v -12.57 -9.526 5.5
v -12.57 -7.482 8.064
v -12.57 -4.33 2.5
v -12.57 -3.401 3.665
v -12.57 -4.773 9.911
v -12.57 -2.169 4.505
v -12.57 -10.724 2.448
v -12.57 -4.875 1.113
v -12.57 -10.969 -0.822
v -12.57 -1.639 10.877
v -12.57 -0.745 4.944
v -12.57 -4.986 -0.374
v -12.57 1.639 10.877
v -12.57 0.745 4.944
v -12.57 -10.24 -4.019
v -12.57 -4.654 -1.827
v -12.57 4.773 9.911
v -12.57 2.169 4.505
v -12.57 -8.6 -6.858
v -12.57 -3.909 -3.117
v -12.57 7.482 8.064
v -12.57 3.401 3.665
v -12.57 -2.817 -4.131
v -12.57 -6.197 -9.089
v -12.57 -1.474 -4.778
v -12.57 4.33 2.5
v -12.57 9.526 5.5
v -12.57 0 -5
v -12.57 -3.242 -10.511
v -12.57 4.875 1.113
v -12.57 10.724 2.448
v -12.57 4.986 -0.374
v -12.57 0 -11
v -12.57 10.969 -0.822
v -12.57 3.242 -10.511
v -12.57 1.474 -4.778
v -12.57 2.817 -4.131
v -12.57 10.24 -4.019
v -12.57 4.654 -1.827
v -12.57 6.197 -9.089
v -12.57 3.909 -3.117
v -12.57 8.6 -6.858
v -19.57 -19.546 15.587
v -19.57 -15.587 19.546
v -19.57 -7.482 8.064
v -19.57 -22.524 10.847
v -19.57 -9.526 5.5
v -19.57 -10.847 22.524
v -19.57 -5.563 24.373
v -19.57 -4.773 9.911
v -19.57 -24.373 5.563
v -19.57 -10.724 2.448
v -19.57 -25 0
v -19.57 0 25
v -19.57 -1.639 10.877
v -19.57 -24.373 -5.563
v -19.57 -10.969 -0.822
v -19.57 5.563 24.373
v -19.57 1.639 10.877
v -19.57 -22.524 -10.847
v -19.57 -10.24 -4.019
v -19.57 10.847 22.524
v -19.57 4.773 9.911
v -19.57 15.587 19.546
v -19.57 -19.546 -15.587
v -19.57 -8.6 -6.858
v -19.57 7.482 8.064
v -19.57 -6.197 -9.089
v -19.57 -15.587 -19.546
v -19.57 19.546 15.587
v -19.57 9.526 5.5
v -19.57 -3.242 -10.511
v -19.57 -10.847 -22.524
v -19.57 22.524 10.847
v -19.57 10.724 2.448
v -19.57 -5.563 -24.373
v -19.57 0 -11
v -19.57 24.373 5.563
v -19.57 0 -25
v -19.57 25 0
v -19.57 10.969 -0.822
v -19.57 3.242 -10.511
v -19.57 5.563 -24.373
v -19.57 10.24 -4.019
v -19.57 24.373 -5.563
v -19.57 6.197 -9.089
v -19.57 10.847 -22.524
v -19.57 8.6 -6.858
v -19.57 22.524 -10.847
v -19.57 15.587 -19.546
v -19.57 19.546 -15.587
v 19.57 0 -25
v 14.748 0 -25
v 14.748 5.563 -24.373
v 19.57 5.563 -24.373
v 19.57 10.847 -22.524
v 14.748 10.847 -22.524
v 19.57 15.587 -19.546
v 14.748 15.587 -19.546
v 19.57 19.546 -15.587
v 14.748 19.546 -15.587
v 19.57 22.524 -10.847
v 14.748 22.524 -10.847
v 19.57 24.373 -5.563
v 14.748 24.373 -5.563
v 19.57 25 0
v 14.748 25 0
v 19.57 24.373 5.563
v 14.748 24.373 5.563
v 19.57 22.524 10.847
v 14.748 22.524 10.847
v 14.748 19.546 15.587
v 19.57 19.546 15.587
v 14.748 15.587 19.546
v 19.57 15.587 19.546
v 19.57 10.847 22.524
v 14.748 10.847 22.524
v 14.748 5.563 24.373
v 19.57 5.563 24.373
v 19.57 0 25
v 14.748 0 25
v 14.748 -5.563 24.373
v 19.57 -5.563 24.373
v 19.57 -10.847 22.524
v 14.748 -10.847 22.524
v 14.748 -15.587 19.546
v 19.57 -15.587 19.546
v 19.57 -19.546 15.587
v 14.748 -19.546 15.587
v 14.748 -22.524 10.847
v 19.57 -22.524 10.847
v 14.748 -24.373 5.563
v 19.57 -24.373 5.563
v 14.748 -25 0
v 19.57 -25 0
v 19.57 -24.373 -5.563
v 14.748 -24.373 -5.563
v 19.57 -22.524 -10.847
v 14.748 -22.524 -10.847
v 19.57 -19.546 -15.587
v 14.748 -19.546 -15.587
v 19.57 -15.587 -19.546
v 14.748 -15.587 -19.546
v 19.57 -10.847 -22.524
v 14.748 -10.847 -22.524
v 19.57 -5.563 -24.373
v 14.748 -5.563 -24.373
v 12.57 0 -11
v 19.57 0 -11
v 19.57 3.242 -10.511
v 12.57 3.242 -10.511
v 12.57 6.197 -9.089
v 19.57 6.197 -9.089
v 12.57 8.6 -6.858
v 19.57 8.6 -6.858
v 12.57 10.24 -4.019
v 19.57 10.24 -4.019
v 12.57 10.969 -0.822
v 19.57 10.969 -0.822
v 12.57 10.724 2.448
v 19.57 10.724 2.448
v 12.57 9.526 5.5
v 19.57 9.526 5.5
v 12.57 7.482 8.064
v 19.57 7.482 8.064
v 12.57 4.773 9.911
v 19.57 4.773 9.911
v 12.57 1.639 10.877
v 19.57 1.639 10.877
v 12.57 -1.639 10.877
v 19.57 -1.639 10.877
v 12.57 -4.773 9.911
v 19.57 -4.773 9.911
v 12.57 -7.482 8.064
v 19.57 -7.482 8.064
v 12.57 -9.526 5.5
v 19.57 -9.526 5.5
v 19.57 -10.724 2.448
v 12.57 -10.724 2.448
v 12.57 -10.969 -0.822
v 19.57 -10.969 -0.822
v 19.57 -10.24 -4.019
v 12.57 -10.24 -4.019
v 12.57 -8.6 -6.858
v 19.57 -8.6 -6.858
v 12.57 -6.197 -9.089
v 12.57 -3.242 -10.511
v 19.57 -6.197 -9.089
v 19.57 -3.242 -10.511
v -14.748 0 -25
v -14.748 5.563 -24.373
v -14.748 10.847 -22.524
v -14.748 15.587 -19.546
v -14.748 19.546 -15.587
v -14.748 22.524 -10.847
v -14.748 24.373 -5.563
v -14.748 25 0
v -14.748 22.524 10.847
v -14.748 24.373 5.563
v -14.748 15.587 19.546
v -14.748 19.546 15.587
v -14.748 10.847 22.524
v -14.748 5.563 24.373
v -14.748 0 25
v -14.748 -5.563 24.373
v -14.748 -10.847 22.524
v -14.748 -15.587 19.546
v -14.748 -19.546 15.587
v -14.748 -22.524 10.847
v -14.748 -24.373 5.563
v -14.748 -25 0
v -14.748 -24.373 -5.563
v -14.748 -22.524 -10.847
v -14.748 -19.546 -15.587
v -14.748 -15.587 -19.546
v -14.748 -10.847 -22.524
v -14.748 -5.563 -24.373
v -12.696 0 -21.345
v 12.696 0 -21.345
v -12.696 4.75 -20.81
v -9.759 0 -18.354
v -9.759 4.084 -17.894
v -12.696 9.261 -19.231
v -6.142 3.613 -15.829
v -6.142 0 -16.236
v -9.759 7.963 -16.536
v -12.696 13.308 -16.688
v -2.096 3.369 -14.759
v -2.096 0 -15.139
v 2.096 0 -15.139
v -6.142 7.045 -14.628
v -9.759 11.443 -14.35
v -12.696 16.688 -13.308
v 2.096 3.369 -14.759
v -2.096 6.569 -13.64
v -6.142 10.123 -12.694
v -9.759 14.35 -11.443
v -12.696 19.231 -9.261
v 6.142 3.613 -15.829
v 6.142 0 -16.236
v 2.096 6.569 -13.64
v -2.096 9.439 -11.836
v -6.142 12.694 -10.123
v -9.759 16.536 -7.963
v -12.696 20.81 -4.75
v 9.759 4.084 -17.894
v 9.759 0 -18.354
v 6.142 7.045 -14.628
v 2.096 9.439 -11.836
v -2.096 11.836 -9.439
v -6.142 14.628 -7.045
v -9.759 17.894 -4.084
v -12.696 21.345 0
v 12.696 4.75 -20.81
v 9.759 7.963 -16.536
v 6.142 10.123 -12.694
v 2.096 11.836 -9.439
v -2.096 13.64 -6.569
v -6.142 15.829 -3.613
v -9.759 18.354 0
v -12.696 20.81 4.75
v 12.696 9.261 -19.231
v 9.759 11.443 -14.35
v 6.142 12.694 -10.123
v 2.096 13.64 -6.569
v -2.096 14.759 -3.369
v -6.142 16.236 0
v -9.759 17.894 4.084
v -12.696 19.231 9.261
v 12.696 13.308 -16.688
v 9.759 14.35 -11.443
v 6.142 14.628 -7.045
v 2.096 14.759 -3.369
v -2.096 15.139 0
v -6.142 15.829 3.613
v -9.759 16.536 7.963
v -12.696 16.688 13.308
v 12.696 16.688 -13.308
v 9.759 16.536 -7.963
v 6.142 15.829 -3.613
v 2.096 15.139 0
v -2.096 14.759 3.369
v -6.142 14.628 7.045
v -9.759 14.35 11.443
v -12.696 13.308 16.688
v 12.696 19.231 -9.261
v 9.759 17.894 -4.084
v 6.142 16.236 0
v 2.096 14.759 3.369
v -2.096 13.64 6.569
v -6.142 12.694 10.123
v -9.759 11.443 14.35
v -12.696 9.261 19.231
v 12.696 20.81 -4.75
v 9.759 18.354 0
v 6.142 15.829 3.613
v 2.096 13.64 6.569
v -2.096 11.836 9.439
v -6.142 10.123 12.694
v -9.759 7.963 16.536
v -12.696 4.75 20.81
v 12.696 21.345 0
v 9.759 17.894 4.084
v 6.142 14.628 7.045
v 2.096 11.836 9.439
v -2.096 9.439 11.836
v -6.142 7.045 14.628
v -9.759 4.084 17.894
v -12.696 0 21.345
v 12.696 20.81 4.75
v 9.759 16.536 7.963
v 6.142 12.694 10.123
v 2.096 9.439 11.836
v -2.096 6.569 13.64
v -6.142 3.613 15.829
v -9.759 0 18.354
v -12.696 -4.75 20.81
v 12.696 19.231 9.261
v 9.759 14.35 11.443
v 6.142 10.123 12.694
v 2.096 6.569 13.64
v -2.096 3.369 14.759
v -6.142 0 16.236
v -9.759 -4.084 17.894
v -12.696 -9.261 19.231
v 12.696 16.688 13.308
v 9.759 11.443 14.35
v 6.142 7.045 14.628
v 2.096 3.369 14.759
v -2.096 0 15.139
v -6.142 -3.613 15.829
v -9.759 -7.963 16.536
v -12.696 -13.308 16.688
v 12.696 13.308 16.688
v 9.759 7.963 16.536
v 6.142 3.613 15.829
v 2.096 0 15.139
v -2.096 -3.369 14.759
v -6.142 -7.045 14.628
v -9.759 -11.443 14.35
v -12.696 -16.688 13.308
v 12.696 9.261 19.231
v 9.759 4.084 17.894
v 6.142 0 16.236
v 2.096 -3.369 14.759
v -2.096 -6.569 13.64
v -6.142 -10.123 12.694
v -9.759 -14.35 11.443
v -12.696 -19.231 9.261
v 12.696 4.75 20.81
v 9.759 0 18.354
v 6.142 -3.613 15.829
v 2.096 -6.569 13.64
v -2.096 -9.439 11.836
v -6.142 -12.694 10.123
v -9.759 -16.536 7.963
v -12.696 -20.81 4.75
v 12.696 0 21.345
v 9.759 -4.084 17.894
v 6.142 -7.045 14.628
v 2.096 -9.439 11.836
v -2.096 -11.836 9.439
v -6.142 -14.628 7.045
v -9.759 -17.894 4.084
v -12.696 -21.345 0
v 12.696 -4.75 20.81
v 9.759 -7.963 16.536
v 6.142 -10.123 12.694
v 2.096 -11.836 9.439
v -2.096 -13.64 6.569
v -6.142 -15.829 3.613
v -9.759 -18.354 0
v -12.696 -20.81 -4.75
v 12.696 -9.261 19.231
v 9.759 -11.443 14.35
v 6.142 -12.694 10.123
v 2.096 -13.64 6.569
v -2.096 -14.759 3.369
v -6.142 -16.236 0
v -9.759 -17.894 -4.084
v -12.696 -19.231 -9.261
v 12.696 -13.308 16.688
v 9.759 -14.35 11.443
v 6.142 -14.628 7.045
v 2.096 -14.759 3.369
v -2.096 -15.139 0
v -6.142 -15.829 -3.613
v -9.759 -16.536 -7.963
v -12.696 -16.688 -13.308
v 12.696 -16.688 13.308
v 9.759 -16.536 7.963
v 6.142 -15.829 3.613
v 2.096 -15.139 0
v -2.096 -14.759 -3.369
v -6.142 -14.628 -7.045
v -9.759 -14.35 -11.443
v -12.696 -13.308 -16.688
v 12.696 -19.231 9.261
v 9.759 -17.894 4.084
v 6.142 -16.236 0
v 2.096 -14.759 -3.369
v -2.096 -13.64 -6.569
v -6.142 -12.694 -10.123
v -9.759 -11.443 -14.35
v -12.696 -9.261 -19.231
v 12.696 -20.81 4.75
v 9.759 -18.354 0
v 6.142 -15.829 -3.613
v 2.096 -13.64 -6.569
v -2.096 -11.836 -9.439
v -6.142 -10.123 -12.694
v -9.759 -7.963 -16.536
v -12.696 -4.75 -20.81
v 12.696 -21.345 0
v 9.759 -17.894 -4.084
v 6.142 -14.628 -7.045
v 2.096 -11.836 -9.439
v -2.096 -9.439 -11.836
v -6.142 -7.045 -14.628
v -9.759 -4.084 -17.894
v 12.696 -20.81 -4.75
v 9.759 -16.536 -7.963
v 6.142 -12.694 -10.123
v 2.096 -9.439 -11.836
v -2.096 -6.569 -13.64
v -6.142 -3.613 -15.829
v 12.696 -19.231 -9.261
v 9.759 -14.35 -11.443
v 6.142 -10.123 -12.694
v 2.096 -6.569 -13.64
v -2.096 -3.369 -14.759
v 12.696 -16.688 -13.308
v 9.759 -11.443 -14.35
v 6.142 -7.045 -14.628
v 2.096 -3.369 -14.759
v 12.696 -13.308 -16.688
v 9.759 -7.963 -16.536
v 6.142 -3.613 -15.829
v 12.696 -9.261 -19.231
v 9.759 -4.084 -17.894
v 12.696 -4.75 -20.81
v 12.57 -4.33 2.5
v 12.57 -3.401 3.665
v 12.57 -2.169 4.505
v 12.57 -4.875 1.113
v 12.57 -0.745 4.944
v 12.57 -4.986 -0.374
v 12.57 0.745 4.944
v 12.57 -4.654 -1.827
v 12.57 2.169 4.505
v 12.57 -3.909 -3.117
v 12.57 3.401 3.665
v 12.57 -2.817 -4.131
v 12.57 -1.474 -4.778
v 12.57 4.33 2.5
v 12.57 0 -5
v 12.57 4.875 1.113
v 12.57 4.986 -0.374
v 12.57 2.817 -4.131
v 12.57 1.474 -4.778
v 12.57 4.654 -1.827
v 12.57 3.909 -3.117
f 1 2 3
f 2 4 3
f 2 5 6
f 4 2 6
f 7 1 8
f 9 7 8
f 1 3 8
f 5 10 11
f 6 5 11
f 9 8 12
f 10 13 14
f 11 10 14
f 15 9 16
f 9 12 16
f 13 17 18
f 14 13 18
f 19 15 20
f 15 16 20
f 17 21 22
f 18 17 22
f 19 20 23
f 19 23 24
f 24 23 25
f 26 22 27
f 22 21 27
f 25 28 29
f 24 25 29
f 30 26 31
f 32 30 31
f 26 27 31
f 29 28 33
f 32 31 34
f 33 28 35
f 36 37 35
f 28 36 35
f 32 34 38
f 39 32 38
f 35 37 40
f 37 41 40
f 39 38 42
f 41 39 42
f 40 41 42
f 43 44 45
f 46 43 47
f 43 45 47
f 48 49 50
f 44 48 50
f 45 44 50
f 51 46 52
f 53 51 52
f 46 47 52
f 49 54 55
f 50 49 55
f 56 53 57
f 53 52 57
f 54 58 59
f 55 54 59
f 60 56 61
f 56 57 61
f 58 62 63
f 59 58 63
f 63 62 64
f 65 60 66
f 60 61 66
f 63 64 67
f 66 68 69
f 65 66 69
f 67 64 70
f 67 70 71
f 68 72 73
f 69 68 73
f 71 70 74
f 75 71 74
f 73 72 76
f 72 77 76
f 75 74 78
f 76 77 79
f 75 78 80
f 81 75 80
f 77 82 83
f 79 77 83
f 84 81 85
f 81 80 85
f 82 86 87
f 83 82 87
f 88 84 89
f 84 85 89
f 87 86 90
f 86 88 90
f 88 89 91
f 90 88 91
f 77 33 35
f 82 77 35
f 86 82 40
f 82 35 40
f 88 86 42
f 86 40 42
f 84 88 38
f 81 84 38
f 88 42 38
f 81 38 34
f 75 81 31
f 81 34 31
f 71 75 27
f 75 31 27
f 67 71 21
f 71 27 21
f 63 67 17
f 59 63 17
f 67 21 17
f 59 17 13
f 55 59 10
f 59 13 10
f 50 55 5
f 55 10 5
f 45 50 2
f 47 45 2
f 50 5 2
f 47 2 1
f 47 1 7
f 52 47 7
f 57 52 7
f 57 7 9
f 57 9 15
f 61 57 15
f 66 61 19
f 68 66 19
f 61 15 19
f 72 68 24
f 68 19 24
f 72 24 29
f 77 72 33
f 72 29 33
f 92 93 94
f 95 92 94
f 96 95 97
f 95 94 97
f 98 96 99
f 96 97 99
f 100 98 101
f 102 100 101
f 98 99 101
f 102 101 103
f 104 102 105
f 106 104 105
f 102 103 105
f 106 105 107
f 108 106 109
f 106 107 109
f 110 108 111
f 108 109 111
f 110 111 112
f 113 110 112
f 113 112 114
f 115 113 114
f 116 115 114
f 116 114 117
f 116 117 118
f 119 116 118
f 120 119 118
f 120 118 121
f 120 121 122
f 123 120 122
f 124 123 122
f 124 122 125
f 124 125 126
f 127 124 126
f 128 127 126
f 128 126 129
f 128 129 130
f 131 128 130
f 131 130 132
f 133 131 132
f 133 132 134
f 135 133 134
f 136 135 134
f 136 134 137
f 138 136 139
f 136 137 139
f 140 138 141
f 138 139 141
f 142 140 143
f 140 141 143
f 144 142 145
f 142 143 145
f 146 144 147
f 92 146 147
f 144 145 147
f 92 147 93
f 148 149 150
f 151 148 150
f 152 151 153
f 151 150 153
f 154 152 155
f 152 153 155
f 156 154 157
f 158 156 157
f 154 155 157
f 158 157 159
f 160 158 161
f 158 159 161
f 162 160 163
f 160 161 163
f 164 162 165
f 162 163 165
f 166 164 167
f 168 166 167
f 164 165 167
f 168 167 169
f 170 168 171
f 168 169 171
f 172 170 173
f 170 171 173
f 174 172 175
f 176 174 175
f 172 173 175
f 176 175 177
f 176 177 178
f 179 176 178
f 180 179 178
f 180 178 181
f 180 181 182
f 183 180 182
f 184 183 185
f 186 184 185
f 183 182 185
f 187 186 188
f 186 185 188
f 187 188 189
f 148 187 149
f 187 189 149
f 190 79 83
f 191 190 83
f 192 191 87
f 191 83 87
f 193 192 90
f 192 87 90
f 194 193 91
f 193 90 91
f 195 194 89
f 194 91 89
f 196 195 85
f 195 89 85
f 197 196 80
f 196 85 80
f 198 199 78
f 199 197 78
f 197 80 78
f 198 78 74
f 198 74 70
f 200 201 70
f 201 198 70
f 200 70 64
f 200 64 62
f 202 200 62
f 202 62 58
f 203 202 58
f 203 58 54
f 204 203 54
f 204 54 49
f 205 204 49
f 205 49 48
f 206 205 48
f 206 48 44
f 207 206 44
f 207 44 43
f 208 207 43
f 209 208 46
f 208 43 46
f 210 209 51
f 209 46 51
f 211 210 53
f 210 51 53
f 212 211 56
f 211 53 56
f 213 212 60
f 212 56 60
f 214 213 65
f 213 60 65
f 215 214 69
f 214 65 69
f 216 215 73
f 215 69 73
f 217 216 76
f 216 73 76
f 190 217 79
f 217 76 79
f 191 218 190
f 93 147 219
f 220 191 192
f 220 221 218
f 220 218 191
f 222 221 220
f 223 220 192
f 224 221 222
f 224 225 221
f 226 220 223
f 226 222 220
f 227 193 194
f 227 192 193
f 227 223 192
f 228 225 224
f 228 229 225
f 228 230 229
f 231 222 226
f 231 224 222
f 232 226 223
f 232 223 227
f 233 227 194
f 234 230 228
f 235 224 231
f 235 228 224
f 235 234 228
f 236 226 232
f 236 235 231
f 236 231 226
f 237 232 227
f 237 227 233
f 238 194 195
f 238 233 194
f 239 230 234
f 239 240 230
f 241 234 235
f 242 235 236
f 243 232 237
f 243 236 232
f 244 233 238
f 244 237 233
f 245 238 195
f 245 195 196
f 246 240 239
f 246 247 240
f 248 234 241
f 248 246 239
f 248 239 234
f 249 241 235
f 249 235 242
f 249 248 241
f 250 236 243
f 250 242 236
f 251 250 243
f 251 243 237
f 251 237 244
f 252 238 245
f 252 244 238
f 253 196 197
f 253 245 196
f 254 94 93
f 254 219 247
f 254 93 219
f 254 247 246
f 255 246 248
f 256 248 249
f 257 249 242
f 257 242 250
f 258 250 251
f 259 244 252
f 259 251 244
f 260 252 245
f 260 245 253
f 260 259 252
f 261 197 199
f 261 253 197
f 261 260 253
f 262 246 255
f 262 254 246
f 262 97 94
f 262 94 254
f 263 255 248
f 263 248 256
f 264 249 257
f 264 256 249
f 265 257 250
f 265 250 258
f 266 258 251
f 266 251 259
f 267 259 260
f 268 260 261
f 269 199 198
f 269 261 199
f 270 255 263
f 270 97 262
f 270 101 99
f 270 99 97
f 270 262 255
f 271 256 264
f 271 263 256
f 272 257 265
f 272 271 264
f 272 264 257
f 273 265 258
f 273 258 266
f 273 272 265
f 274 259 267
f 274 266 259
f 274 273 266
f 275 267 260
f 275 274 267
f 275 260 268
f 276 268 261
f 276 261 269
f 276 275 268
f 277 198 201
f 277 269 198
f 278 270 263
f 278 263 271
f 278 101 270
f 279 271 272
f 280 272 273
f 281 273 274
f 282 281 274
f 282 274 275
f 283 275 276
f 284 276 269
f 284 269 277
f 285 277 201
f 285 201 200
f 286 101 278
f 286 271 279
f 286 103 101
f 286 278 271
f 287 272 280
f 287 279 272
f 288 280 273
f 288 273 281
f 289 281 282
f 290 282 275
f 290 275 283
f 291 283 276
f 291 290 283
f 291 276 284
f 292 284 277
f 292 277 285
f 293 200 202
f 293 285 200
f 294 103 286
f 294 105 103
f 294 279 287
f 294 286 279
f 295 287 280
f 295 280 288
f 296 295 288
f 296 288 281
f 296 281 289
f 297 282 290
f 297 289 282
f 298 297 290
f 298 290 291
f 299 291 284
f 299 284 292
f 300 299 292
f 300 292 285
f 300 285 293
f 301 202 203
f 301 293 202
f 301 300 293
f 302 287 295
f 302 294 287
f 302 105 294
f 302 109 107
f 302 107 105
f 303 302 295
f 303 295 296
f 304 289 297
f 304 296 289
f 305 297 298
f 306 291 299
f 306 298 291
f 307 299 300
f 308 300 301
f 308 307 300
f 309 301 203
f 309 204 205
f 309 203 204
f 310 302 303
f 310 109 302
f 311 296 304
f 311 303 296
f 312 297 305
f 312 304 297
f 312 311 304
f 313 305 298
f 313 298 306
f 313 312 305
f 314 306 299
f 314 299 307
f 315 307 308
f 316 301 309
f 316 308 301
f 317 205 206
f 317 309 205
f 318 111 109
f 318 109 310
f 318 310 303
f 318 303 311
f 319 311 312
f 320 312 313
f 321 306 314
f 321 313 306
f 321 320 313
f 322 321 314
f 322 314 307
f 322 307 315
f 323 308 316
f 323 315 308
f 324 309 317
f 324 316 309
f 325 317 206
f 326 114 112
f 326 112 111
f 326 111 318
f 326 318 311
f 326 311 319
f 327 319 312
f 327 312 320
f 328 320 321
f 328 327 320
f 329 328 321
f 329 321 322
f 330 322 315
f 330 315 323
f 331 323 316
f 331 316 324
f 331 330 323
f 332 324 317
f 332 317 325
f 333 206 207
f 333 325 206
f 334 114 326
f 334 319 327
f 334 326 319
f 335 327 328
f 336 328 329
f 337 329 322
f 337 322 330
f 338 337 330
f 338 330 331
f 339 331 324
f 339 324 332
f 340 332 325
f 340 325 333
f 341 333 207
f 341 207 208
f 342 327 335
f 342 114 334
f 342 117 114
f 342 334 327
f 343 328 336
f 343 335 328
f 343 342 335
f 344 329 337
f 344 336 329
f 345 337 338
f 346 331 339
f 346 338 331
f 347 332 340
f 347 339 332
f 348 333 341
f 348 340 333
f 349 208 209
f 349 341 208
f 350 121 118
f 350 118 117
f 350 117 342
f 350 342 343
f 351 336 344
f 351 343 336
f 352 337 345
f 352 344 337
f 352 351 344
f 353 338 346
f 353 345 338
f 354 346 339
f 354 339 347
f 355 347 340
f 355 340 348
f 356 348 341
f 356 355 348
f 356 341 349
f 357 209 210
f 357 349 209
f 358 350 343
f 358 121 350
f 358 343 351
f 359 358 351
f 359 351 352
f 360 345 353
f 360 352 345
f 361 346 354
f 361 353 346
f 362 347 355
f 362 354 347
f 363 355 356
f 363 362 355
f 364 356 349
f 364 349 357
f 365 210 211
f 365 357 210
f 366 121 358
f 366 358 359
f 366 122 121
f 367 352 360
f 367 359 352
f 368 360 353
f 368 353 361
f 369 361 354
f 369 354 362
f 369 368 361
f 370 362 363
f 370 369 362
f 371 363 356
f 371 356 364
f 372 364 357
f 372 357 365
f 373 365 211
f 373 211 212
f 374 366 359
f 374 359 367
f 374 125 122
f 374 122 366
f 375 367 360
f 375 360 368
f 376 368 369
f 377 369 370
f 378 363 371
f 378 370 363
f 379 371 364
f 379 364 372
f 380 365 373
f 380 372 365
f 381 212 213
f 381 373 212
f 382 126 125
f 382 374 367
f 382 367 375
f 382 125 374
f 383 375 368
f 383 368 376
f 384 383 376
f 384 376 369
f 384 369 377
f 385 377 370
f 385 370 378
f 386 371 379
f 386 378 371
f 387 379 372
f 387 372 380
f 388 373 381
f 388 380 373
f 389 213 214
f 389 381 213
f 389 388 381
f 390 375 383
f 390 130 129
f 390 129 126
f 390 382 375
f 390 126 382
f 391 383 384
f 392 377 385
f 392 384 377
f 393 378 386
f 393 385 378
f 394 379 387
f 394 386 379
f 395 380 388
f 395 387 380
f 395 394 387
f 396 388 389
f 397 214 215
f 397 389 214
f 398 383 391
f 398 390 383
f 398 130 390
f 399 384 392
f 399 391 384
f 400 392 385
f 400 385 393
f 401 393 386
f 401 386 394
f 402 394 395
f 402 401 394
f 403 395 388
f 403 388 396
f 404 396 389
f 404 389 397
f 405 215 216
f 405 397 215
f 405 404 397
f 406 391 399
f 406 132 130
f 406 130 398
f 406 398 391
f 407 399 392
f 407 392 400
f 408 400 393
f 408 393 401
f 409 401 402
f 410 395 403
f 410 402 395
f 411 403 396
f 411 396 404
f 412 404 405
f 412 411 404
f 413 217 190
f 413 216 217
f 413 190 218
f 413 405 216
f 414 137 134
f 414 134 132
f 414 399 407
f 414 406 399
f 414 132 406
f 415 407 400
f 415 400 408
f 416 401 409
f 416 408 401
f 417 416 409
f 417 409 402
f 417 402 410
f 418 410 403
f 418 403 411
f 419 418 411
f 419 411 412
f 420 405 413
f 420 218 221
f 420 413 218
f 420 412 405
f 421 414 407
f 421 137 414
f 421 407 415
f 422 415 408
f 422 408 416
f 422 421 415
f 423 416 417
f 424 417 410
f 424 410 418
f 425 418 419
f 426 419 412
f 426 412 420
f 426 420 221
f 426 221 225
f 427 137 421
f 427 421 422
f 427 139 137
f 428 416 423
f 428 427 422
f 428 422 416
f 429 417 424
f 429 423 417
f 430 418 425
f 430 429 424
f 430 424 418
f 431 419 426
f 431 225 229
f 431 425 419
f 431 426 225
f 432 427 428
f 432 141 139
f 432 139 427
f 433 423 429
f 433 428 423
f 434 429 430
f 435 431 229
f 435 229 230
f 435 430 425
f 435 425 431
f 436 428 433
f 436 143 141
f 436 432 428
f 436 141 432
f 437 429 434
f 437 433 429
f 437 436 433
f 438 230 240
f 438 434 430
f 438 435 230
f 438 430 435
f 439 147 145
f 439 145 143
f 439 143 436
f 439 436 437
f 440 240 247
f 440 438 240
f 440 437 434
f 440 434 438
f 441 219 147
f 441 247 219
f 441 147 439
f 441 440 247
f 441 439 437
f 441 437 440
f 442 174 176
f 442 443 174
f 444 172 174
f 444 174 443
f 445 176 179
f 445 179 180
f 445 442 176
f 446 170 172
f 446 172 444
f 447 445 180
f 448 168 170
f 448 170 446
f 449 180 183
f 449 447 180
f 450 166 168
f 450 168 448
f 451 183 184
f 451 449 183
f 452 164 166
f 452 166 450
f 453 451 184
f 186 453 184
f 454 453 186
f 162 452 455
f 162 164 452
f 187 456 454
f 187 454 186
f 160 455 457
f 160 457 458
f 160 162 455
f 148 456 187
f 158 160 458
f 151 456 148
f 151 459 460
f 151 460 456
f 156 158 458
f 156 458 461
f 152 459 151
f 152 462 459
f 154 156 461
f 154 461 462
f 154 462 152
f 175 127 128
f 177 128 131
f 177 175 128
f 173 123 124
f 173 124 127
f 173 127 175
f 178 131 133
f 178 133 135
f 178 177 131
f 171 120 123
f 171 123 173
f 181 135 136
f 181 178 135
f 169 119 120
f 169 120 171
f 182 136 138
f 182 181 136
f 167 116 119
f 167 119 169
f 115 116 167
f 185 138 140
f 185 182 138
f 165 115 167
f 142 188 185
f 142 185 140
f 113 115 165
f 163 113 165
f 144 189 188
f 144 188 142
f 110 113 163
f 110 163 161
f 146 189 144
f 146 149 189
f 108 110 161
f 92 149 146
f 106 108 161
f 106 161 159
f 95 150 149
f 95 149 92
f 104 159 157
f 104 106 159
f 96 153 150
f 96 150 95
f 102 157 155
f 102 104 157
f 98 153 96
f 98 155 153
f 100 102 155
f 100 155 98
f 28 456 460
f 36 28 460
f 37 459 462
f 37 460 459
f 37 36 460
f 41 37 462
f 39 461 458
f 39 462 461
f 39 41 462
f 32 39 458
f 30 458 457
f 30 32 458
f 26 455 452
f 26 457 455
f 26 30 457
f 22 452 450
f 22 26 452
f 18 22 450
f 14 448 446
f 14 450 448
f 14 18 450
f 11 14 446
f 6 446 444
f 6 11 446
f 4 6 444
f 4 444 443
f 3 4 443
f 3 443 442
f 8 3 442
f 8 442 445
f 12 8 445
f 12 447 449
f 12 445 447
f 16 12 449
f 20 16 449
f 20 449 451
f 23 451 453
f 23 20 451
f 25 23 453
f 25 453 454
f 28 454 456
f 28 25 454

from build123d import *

# Parameters (mm, degrees)
BOSS_EXTRUDE1_DEPTH      = 19.57
BOSS_EXTRUDE1_DEPTH_BACK = 19.57
SKETCH1_R                = 25
SKETCH1_R_2              = 5
CUT_EXTRUDE1_START       = 19.57
SKETCH2_R                = 11
CUT_EXTRUDE1_DEPTH       = 7
CUT_EXTRUDE2_START       = -12.57
SKETCH3_R                = 11
CUT_EXTRUDE2_DEPTH       = 7
SKETCH4_R                = 15.875


with BuildPart() as part:
    # Sketch1 → Boss-Extrude1 (new, two sides: drawn at the far end of the back side and taken through both)
    with BuildSketch(Plane(origin=(0, 0, 0), x_dir=(0, 0, -1), z_dir=(1, 0, 0)).offset(-BOSS_EXTRUDE1_DEPTH_BACK)):
        Circle(SKETCH1_R)
        Circle(SKETCH1_R_2, mode=Mode.SUBTRACT)
    extrude(amount=BOSS_EXTRUDE1_DEPTH + BOSS_EXTRUDE1_DEPTH_BACK)

    # Sketch2 → Cut-Extrude1 (cut)
    with BuildSketch(Plane(origin=(0, 0, 0), x_dir=(0, 0, -1), z_dir=(1, 0, 0)).offset(CUT_EXTRUDE1_START)):
        Circle(SKETCH2_R)
    extrude(amount=-CUT_EXTRUDE1_DEPTH, mode=Mode.SUBTRACT)

    # Sketch3 → Cut-Extrude2 (cut)
    with BuildSketch(Plane(origin=(0, 0, 0), x_dir=(0, 0, -1), z_dir=(1, 0, 0)).offset(CUT_EXTRUDE2_START)):
        Circle(SKETCH3_R)
    extrude(amount=-CUT_EXTRUDE2_DEPTH, mode=Mode.SUBTRACT)

    # Sketch4 → Cut-Revolve1 (revolve, cut)
    with BuildSketch(Plane.XY, mode=Mode.PRIVATE) as cut_revolve1_sk:
        with Locations((0, 30.875)):
            Circle(SKETCH4_R)
    revolve(cut_revolve1_sk.sketch.rotate(Axis((0, 0, 0), (1, 0, 0)), 270), axis=Axis((0, 0, 0), (1, 0, 0)), mode=Mode.SUBTRACT)


solid = part.part
